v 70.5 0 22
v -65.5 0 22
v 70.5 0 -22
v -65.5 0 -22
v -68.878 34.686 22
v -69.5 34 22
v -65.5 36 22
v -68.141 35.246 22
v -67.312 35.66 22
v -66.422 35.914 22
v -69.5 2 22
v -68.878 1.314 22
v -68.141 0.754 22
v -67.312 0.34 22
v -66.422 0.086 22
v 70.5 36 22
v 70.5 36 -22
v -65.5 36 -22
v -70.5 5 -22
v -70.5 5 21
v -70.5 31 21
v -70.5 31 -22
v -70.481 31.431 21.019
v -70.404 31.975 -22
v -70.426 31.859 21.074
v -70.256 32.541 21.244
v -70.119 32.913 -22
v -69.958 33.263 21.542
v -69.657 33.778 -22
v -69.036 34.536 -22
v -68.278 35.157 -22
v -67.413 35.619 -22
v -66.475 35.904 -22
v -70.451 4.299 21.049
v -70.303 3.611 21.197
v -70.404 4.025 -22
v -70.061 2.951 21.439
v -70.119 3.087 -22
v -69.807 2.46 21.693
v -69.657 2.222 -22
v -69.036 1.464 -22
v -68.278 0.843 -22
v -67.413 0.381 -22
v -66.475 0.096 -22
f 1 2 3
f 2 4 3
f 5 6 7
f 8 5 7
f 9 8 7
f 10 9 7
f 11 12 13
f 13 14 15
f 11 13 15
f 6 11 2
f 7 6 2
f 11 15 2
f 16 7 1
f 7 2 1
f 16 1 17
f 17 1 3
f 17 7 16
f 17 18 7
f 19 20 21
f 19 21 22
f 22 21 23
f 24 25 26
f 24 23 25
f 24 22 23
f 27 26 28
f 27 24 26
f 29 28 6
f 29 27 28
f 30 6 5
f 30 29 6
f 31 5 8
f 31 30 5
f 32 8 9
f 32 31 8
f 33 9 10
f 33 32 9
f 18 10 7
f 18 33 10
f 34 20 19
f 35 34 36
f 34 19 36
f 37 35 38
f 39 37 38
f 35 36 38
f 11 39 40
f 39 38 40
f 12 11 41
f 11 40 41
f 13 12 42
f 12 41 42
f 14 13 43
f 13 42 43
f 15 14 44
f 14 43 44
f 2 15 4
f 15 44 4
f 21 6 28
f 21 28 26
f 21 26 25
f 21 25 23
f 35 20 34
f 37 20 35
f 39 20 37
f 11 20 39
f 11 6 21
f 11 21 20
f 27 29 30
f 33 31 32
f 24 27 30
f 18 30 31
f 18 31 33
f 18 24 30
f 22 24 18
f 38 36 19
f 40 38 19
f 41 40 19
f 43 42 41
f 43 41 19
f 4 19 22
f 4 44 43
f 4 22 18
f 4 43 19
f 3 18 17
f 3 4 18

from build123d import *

# Parameters (mm, degrees)
SKETCH_1_W      = 141
SKETCH_1_H      = 44
EXTRUDE_1_DEPTH = 36
FILLET_1_R      = 5


with BuildPart() as part:
    # 草图1 → 凸台-拉伸1 (new body)
    with BuildSketch(Plane(origin=(0, 0, 0), x_dir=(1, 0, 0), z_dir=(0, 1, 0))):
        Rectangle(SKETCH_1_W, SKETCH_1_H)
    extrude(amount=EXTRUDE_1_DEPTH)

    # 圆角1
    fillet_1_edges = [part.edges().sort_by_distance(p)[0] for p in [
        (-70.5, 36, 0),
        (-70.5, 0, 0),
    ]]
    fillet(fillet_1_edges, radius=FILLET_1_R)

    # 倒角1
    # the kernel refuses this chamfer: 1 mm, written as the material it takes off along each edge
    with BuildSketch(Plane(origin=(-70.5, -1.172039171, 22), x_dir=(0.9996219169112968, 0, 0.02749587661058574), z_dir=(0, 1, 0))) as chamfer_1_piece_1:
        with BuildLine():
            Line((1.028673195, 0), (-0.056547155, 1.027117794))
            Line((-0.056547155, 1.027117794), (-0.076539593, 1.026567876))
            ThreePointArc((-0.076539593, 1.026567876), (-0.034129227, 0.51339783), (-0.019992438, -0.000549918))
            Line((-0.019992438, -0.000549918), (0.000549918, -0.019992438))
            ThreePointArc((0.000549918, -0.019992438), (0.514497665, -0.00585565), (1.029223113, -0.019992438))
            Line((1.029223113, -0.019992438), (1.028673195, 0))
        make_face()
    extrude(amount=38.344078342, mode=Mode.SUBTRACT)


solid = part.part
